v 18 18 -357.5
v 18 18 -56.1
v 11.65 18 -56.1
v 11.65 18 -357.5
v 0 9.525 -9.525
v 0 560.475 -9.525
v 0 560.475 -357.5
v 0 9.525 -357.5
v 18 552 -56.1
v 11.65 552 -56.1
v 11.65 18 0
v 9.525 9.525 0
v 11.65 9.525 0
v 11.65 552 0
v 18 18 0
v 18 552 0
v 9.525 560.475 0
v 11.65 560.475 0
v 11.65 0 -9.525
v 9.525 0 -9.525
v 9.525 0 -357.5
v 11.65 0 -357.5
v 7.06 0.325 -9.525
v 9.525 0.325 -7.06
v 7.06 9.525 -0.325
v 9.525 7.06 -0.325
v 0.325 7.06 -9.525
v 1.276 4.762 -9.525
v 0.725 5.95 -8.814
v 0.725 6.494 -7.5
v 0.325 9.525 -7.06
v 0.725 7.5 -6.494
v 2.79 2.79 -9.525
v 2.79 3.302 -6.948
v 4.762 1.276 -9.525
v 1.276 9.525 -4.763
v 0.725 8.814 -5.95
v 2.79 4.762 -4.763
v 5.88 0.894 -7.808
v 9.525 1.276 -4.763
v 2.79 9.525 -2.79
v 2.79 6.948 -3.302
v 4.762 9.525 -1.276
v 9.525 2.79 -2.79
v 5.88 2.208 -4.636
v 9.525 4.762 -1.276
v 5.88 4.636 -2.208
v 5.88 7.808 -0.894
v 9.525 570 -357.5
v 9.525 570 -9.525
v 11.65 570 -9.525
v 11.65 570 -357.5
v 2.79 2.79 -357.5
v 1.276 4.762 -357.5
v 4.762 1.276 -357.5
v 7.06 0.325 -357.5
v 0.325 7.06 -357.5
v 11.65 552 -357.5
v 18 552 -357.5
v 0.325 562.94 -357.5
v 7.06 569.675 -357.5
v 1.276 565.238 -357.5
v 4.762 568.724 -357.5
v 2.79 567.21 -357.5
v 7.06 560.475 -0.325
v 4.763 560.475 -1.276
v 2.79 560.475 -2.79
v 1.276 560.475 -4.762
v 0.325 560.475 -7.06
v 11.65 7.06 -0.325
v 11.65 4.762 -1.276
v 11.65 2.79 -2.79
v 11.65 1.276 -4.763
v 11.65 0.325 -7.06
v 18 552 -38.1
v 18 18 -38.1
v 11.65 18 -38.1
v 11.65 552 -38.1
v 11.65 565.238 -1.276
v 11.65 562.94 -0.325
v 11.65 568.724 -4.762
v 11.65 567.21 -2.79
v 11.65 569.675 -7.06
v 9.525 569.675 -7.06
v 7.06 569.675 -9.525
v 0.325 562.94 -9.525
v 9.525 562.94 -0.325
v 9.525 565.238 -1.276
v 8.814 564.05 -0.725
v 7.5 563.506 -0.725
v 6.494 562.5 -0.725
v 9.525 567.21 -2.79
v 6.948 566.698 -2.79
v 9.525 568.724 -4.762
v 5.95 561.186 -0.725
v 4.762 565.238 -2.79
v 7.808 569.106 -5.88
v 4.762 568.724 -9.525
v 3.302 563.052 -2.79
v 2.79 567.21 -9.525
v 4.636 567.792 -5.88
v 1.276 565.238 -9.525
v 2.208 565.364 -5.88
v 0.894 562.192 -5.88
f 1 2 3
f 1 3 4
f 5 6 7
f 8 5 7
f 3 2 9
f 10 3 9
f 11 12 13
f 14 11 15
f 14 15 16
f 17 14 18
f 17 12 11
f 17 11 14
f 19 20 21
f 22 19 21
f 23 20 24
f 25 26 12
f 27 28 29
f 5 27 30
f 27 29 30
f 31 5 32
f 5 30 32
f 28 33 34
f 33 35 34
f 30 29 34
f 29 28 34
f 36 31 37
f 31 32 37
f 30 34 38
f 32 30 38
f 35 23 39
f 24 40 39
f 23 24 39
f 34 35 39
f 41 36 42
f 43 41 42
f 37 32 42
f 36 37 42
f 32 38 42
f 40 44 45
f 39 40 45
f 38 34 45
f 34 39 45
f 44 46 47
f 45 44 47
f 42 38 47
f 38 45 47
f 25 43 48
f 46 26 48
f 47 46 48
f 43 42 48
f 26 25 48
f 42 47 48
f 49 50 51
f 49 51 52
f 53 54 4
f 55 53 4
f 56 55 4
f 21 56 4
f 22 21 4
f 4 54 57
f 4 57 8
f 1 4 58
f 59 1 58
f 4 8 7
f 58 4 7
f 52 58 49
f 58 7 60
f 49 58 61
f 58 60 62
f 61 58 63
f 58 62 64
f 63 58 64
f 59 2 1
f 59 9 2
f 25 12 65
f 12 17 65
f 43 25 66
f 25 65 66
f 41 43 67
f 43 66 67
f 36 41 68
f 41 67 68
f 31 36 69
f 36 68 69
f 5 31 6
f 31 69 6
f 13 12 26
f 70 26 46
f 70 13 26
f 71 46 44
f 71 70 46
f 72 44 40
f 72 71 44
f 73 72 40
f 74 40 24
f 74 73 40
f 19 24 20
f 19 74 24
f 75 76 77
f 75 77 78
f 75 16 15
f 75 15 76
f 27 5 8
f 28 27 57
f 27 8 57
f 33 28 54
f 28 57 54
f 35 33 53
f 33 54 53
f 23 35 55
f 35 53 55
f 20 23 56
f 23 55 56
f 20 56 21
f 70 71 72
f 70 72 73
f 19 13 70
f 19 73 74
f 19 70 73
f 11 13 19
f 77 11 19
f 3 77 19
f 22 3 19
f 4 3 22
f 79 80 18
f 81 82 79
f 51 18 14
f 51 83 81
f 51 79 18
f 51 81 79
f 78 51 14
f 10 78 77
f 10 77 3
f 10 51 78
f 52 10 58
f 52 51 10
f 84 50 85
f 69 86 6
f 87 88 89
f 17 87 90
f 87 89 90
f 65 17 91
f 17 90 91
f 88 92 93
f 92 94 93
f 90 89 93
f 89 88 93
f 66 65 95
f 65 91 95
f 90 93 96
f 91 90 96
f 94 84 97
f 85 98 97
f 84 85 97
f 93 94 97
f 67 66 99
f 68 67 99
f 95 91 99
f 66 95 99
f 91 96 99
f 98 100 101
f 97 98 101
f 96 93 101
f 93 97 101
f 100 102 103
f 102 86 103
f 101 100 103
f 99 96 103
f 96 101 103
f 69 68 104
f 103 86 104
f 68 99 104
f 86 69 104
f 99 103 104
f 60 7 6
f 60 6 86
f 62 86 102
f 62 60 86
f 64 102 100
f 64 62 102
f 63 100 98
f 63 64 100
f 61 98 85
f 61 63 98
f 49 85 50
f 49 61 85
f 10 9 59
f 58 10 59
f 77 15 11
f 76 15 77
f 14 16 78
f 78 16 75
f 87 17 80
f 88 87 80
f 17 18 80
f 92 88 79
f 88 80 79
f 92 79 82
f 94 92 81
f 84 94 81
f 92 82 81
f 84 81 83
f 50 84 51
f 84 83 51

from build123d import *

# Parameters (mm, degrees)
SKETCH1_W           = 357.50000001
SKETCH1_H           = 570
BOSS_EXTRUDE1_DEPTH = 18
SKETCH5_W           = 18
SKETCH5_H           = 557.3
CUT_EXTRUDE3_DEPTH  = 6.35
SKETCH7_W           = 357.50000001
SKETCH7_H           = 18
CUT_EXTRUDE4_DEPTH  = 6.35
FILLET1_R           = 9.525


with BuildPart() as part:
    # Sketch1 → Boss-Extrude1 (new body)
    with BuildSketch(Plane(origin=(0, 0, 0), x_dir=(0, 0, -1), z_dir=(1, 0, 0))):
        with Locations((178.750000005, 285)):
            Rectangle(SKETCH1_W, SKETCH1_H)
    extrude(amount=BOSS_EXTRUDE1_DEPTH)

    # Sketch5 → Cut-Extrude3 (cut)
    with BuildSketch(Plane(origin=(18, 0, 0), x_dir=(0, 0, -1), z_dir=(1, 0, 0))):
        with Locations((47.1, 285)):
            Rectangle(SKETCH5_W, SKETCH5_H)
    extrude(amount=-CUT_EXTRUDE3_DEPTH, mode=Mode.SUBTRACT)

    # Sketch7 → Cut-Extrude4 (cut)
    with BuildSketch(Plane(origin=(18, 0, 0), x_dir=(0, 0, -1), z_dir=(1, 0, 0))):
        with Locations((178.750000005, 9)):
            Rectangle(SKETCH7_W, SKETCH7_H)
        with Locations((178.750000005, 561)):
            Rectangle(SKETCH7_W, SKETCH7_H)
    extrude(amount=-CUT_EXTRUDE4_DEPTH, mode=Mode.SUBTRACT)

    # Fillet1
    fillet1_edges = [part.edges().sort_by_distance(p)[0] for p in [
        (5.825, 0, 0),
        (0, 570, -178.750000005),
        (0, 0, -178.750000005),
        (5.825, 570, 0),
        (0, 285, 0),
    ]]
    fillet(fillet1_edges, radius=FILLET1_R)


solid = part.part
